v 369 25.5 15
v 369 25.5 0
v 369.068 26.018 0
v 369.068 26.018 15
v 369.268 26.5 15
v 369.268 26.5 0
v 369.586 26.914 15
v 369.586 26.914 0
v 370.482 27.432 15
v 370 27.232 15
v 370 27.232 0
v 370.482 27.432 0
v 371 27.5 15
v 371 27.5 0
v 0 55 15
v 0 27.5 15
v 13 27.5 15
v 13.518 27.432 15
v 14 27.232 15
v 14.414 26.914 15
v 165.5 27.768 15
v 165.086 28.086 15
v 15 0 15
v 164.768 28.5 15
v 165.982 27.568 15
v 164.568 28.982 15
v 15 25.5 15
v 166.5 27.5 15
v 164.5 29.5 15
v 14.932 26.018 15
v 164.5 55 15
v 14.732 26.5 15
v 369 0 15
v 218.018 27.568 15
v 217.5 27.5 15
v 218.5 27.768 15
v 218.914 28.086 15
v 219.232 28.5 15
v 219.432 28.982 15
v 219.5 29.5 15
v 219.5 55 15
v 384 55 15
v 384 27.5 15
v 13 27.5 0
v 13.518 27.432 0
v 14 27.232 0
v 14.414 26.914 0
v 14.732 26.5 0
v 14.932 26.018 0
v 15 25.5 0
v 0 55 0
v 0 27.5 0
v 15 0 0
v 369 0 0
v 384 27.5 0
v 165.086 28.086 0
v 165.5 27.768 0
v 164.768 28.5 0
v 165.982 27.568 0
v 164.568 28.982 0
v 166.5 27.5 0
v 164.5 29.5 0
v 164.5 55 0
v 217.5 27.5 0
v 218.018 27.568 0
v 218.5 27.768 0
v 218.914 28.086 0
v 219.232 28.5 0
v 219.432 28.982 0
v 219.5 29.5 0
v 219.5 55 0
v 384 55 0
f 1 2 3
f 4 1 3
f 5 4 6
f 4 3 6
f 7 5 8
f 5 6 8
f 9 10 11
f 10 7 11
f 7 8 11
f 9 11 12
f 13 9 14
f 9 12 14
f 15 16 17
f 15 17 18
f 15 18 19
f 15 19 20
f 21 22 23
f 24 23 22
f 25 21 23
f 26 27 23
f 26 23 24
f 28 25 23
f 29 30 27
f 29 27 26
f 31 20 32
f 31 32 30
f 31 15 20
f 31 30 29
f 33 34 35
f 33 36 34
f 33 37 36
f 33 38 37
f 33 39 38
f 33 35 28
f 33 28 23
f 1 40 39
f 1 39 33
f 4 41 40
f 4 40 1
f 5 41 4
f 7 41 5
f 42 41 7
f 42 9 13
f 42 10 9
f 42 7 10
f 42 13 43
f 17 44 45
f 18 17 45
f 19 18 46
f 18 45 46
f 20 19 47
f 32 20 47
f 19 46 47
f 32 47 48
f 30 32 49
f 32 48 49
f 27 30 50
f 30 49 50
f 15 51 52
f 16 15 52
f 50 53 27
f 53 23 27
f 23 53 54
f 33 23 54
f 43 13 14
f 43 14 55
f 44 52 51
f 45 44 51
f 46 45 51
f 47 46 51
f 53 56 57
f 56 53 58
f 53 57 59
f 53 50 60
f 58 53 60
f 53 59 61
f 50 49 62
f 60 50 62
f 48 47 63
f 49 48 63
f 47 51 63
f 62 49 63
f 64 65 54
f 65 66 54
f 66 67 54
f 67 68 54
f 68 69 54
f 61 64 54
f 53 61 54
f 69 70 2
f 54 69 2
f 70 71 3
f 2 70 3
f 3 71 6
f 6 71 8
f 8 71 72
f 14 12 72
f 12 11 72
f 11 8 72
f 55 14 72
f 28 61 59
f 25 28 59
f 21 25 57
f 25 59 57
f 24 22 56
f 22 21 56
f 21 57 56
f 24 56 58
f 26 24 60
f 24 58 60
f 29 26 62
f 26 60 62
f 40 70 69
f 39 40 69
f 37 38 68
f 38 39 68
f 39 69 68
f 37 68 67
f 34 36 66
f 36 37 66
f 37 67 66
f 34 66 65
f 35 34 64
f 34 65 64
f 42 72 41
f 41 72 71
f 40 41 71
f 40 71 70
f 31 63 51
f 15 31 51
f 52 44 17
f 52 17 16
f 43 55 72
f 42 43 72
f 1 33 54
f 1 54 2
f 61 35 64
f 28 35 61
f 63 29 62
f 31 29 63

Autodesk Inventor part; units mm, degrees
ref_plane "YZ Plane" through (0, 0, 0) normal (1, 0, 0) x (0, 1, 0)
ref_plane "XZ Plane" through (0, 0, 0) normal (0, 1, 0) x (-1, 0, 0)
sketch "Sketch1" plane through (0, 0, 0) normal (0, 0, 1) x (1, 0, 0)
  line L0 (0, 0) -> (384, 0)
  line L1 (384, 0) -> (384, 55)
  line L2 (384, 55) -> (0, 55)
  line L3 (0, 55) -> (0, 0)
  dimension "d0" = 55
  dimension "d1" = 384
extrude "Extrusion1" add sketch "Sketch1" along normal blind 15
sketch "Sketch4" plane through (0, 0, 15) normal (0, 0, 1) x (1, 0, 0)
  line L0 (0, 0) -> (15, 0)
  line L1 (15, 0) -> (15, 27.5)
  line L2 (15, 27.5) -> (0, 27.5)
  line L3 (0, 27.5) -> (0, 0)
  line L4 (384, 55) -> (0, 55) projected
  line L5 (192, 55) -> (192, 39.783)
  line L6 (164.5, 55) -> (219.5, 55)
  line L7 (219.5, 55) -> (219.5, 27.5)
  line L8 (219.5, 27.5) -> (164.5, 27.5)
  line L9 (164.5, 27.5) -> (164.5, 55)
  line L10 (384, 0) -> (369, 0)
  line L11 (369, 0) -> (369, 27.5)
  line L12 (369, 27.5) -> (384, 27.5)
  line L13 (384, 27.5) -> (384, 0)
  point P0 (192, 27.5)
  dimension "d23" = 15
  dimension "d24" = 27.5
  dimension "d25" = 55
extrude "Extrusion2" cut sketch "Sketch4" against normal through all
ref_plane "Work Plane1" through (192, 55, 15) normal (1, 0, 0) x (0, 0, -1)
fillet "Fillet1" radius 2 4 edges at (15, 27.5, 7.5) (164.5, 27.5, 7.5) (219.5, 27.5, 7.5) (369, 27.5, 7.5)
sketch "Sketch2" plane through (0, 55, 0) normal (0, 1, 0) x (1, 0, 0)
  line L0 (7.5, -7.5) -> (376.5, -7.5)
  line L1 (0, 0) -> (0, -15) projected
  line L2 (384, 0) -> (0, 0) projected
  point P0 (192, -7.5)
  point P1 (0, -7.5)
  point P2 (192, 0)
  dimension "d4" = 369
sketch "Sketch3" plane through (0, 0, 0) normal (0, 0, -1) x (-1, 0, 0)
  line L0 (-384, 0) -> (-384, 55) projected
  line L1 (0, 0) -> (-384, 0) projected
  line L2 (0, 55) -> (0, 0) projected
  line L3 (-384, 55) -> (0, 55) projected
  line L4 (-7.5, 10) -> (-376.5, 10)
  line L5 (-376.5, 45) -> (-7.5, 45)
  dimension "d12" = 10
  dimension "d20" = 10
  dimension "d21" = 7.5
  dimension "d22" = 7.5
equation "\"d20\" = d12"
equation "\"d22\" = d21"
properties part number "Breadth Board"
